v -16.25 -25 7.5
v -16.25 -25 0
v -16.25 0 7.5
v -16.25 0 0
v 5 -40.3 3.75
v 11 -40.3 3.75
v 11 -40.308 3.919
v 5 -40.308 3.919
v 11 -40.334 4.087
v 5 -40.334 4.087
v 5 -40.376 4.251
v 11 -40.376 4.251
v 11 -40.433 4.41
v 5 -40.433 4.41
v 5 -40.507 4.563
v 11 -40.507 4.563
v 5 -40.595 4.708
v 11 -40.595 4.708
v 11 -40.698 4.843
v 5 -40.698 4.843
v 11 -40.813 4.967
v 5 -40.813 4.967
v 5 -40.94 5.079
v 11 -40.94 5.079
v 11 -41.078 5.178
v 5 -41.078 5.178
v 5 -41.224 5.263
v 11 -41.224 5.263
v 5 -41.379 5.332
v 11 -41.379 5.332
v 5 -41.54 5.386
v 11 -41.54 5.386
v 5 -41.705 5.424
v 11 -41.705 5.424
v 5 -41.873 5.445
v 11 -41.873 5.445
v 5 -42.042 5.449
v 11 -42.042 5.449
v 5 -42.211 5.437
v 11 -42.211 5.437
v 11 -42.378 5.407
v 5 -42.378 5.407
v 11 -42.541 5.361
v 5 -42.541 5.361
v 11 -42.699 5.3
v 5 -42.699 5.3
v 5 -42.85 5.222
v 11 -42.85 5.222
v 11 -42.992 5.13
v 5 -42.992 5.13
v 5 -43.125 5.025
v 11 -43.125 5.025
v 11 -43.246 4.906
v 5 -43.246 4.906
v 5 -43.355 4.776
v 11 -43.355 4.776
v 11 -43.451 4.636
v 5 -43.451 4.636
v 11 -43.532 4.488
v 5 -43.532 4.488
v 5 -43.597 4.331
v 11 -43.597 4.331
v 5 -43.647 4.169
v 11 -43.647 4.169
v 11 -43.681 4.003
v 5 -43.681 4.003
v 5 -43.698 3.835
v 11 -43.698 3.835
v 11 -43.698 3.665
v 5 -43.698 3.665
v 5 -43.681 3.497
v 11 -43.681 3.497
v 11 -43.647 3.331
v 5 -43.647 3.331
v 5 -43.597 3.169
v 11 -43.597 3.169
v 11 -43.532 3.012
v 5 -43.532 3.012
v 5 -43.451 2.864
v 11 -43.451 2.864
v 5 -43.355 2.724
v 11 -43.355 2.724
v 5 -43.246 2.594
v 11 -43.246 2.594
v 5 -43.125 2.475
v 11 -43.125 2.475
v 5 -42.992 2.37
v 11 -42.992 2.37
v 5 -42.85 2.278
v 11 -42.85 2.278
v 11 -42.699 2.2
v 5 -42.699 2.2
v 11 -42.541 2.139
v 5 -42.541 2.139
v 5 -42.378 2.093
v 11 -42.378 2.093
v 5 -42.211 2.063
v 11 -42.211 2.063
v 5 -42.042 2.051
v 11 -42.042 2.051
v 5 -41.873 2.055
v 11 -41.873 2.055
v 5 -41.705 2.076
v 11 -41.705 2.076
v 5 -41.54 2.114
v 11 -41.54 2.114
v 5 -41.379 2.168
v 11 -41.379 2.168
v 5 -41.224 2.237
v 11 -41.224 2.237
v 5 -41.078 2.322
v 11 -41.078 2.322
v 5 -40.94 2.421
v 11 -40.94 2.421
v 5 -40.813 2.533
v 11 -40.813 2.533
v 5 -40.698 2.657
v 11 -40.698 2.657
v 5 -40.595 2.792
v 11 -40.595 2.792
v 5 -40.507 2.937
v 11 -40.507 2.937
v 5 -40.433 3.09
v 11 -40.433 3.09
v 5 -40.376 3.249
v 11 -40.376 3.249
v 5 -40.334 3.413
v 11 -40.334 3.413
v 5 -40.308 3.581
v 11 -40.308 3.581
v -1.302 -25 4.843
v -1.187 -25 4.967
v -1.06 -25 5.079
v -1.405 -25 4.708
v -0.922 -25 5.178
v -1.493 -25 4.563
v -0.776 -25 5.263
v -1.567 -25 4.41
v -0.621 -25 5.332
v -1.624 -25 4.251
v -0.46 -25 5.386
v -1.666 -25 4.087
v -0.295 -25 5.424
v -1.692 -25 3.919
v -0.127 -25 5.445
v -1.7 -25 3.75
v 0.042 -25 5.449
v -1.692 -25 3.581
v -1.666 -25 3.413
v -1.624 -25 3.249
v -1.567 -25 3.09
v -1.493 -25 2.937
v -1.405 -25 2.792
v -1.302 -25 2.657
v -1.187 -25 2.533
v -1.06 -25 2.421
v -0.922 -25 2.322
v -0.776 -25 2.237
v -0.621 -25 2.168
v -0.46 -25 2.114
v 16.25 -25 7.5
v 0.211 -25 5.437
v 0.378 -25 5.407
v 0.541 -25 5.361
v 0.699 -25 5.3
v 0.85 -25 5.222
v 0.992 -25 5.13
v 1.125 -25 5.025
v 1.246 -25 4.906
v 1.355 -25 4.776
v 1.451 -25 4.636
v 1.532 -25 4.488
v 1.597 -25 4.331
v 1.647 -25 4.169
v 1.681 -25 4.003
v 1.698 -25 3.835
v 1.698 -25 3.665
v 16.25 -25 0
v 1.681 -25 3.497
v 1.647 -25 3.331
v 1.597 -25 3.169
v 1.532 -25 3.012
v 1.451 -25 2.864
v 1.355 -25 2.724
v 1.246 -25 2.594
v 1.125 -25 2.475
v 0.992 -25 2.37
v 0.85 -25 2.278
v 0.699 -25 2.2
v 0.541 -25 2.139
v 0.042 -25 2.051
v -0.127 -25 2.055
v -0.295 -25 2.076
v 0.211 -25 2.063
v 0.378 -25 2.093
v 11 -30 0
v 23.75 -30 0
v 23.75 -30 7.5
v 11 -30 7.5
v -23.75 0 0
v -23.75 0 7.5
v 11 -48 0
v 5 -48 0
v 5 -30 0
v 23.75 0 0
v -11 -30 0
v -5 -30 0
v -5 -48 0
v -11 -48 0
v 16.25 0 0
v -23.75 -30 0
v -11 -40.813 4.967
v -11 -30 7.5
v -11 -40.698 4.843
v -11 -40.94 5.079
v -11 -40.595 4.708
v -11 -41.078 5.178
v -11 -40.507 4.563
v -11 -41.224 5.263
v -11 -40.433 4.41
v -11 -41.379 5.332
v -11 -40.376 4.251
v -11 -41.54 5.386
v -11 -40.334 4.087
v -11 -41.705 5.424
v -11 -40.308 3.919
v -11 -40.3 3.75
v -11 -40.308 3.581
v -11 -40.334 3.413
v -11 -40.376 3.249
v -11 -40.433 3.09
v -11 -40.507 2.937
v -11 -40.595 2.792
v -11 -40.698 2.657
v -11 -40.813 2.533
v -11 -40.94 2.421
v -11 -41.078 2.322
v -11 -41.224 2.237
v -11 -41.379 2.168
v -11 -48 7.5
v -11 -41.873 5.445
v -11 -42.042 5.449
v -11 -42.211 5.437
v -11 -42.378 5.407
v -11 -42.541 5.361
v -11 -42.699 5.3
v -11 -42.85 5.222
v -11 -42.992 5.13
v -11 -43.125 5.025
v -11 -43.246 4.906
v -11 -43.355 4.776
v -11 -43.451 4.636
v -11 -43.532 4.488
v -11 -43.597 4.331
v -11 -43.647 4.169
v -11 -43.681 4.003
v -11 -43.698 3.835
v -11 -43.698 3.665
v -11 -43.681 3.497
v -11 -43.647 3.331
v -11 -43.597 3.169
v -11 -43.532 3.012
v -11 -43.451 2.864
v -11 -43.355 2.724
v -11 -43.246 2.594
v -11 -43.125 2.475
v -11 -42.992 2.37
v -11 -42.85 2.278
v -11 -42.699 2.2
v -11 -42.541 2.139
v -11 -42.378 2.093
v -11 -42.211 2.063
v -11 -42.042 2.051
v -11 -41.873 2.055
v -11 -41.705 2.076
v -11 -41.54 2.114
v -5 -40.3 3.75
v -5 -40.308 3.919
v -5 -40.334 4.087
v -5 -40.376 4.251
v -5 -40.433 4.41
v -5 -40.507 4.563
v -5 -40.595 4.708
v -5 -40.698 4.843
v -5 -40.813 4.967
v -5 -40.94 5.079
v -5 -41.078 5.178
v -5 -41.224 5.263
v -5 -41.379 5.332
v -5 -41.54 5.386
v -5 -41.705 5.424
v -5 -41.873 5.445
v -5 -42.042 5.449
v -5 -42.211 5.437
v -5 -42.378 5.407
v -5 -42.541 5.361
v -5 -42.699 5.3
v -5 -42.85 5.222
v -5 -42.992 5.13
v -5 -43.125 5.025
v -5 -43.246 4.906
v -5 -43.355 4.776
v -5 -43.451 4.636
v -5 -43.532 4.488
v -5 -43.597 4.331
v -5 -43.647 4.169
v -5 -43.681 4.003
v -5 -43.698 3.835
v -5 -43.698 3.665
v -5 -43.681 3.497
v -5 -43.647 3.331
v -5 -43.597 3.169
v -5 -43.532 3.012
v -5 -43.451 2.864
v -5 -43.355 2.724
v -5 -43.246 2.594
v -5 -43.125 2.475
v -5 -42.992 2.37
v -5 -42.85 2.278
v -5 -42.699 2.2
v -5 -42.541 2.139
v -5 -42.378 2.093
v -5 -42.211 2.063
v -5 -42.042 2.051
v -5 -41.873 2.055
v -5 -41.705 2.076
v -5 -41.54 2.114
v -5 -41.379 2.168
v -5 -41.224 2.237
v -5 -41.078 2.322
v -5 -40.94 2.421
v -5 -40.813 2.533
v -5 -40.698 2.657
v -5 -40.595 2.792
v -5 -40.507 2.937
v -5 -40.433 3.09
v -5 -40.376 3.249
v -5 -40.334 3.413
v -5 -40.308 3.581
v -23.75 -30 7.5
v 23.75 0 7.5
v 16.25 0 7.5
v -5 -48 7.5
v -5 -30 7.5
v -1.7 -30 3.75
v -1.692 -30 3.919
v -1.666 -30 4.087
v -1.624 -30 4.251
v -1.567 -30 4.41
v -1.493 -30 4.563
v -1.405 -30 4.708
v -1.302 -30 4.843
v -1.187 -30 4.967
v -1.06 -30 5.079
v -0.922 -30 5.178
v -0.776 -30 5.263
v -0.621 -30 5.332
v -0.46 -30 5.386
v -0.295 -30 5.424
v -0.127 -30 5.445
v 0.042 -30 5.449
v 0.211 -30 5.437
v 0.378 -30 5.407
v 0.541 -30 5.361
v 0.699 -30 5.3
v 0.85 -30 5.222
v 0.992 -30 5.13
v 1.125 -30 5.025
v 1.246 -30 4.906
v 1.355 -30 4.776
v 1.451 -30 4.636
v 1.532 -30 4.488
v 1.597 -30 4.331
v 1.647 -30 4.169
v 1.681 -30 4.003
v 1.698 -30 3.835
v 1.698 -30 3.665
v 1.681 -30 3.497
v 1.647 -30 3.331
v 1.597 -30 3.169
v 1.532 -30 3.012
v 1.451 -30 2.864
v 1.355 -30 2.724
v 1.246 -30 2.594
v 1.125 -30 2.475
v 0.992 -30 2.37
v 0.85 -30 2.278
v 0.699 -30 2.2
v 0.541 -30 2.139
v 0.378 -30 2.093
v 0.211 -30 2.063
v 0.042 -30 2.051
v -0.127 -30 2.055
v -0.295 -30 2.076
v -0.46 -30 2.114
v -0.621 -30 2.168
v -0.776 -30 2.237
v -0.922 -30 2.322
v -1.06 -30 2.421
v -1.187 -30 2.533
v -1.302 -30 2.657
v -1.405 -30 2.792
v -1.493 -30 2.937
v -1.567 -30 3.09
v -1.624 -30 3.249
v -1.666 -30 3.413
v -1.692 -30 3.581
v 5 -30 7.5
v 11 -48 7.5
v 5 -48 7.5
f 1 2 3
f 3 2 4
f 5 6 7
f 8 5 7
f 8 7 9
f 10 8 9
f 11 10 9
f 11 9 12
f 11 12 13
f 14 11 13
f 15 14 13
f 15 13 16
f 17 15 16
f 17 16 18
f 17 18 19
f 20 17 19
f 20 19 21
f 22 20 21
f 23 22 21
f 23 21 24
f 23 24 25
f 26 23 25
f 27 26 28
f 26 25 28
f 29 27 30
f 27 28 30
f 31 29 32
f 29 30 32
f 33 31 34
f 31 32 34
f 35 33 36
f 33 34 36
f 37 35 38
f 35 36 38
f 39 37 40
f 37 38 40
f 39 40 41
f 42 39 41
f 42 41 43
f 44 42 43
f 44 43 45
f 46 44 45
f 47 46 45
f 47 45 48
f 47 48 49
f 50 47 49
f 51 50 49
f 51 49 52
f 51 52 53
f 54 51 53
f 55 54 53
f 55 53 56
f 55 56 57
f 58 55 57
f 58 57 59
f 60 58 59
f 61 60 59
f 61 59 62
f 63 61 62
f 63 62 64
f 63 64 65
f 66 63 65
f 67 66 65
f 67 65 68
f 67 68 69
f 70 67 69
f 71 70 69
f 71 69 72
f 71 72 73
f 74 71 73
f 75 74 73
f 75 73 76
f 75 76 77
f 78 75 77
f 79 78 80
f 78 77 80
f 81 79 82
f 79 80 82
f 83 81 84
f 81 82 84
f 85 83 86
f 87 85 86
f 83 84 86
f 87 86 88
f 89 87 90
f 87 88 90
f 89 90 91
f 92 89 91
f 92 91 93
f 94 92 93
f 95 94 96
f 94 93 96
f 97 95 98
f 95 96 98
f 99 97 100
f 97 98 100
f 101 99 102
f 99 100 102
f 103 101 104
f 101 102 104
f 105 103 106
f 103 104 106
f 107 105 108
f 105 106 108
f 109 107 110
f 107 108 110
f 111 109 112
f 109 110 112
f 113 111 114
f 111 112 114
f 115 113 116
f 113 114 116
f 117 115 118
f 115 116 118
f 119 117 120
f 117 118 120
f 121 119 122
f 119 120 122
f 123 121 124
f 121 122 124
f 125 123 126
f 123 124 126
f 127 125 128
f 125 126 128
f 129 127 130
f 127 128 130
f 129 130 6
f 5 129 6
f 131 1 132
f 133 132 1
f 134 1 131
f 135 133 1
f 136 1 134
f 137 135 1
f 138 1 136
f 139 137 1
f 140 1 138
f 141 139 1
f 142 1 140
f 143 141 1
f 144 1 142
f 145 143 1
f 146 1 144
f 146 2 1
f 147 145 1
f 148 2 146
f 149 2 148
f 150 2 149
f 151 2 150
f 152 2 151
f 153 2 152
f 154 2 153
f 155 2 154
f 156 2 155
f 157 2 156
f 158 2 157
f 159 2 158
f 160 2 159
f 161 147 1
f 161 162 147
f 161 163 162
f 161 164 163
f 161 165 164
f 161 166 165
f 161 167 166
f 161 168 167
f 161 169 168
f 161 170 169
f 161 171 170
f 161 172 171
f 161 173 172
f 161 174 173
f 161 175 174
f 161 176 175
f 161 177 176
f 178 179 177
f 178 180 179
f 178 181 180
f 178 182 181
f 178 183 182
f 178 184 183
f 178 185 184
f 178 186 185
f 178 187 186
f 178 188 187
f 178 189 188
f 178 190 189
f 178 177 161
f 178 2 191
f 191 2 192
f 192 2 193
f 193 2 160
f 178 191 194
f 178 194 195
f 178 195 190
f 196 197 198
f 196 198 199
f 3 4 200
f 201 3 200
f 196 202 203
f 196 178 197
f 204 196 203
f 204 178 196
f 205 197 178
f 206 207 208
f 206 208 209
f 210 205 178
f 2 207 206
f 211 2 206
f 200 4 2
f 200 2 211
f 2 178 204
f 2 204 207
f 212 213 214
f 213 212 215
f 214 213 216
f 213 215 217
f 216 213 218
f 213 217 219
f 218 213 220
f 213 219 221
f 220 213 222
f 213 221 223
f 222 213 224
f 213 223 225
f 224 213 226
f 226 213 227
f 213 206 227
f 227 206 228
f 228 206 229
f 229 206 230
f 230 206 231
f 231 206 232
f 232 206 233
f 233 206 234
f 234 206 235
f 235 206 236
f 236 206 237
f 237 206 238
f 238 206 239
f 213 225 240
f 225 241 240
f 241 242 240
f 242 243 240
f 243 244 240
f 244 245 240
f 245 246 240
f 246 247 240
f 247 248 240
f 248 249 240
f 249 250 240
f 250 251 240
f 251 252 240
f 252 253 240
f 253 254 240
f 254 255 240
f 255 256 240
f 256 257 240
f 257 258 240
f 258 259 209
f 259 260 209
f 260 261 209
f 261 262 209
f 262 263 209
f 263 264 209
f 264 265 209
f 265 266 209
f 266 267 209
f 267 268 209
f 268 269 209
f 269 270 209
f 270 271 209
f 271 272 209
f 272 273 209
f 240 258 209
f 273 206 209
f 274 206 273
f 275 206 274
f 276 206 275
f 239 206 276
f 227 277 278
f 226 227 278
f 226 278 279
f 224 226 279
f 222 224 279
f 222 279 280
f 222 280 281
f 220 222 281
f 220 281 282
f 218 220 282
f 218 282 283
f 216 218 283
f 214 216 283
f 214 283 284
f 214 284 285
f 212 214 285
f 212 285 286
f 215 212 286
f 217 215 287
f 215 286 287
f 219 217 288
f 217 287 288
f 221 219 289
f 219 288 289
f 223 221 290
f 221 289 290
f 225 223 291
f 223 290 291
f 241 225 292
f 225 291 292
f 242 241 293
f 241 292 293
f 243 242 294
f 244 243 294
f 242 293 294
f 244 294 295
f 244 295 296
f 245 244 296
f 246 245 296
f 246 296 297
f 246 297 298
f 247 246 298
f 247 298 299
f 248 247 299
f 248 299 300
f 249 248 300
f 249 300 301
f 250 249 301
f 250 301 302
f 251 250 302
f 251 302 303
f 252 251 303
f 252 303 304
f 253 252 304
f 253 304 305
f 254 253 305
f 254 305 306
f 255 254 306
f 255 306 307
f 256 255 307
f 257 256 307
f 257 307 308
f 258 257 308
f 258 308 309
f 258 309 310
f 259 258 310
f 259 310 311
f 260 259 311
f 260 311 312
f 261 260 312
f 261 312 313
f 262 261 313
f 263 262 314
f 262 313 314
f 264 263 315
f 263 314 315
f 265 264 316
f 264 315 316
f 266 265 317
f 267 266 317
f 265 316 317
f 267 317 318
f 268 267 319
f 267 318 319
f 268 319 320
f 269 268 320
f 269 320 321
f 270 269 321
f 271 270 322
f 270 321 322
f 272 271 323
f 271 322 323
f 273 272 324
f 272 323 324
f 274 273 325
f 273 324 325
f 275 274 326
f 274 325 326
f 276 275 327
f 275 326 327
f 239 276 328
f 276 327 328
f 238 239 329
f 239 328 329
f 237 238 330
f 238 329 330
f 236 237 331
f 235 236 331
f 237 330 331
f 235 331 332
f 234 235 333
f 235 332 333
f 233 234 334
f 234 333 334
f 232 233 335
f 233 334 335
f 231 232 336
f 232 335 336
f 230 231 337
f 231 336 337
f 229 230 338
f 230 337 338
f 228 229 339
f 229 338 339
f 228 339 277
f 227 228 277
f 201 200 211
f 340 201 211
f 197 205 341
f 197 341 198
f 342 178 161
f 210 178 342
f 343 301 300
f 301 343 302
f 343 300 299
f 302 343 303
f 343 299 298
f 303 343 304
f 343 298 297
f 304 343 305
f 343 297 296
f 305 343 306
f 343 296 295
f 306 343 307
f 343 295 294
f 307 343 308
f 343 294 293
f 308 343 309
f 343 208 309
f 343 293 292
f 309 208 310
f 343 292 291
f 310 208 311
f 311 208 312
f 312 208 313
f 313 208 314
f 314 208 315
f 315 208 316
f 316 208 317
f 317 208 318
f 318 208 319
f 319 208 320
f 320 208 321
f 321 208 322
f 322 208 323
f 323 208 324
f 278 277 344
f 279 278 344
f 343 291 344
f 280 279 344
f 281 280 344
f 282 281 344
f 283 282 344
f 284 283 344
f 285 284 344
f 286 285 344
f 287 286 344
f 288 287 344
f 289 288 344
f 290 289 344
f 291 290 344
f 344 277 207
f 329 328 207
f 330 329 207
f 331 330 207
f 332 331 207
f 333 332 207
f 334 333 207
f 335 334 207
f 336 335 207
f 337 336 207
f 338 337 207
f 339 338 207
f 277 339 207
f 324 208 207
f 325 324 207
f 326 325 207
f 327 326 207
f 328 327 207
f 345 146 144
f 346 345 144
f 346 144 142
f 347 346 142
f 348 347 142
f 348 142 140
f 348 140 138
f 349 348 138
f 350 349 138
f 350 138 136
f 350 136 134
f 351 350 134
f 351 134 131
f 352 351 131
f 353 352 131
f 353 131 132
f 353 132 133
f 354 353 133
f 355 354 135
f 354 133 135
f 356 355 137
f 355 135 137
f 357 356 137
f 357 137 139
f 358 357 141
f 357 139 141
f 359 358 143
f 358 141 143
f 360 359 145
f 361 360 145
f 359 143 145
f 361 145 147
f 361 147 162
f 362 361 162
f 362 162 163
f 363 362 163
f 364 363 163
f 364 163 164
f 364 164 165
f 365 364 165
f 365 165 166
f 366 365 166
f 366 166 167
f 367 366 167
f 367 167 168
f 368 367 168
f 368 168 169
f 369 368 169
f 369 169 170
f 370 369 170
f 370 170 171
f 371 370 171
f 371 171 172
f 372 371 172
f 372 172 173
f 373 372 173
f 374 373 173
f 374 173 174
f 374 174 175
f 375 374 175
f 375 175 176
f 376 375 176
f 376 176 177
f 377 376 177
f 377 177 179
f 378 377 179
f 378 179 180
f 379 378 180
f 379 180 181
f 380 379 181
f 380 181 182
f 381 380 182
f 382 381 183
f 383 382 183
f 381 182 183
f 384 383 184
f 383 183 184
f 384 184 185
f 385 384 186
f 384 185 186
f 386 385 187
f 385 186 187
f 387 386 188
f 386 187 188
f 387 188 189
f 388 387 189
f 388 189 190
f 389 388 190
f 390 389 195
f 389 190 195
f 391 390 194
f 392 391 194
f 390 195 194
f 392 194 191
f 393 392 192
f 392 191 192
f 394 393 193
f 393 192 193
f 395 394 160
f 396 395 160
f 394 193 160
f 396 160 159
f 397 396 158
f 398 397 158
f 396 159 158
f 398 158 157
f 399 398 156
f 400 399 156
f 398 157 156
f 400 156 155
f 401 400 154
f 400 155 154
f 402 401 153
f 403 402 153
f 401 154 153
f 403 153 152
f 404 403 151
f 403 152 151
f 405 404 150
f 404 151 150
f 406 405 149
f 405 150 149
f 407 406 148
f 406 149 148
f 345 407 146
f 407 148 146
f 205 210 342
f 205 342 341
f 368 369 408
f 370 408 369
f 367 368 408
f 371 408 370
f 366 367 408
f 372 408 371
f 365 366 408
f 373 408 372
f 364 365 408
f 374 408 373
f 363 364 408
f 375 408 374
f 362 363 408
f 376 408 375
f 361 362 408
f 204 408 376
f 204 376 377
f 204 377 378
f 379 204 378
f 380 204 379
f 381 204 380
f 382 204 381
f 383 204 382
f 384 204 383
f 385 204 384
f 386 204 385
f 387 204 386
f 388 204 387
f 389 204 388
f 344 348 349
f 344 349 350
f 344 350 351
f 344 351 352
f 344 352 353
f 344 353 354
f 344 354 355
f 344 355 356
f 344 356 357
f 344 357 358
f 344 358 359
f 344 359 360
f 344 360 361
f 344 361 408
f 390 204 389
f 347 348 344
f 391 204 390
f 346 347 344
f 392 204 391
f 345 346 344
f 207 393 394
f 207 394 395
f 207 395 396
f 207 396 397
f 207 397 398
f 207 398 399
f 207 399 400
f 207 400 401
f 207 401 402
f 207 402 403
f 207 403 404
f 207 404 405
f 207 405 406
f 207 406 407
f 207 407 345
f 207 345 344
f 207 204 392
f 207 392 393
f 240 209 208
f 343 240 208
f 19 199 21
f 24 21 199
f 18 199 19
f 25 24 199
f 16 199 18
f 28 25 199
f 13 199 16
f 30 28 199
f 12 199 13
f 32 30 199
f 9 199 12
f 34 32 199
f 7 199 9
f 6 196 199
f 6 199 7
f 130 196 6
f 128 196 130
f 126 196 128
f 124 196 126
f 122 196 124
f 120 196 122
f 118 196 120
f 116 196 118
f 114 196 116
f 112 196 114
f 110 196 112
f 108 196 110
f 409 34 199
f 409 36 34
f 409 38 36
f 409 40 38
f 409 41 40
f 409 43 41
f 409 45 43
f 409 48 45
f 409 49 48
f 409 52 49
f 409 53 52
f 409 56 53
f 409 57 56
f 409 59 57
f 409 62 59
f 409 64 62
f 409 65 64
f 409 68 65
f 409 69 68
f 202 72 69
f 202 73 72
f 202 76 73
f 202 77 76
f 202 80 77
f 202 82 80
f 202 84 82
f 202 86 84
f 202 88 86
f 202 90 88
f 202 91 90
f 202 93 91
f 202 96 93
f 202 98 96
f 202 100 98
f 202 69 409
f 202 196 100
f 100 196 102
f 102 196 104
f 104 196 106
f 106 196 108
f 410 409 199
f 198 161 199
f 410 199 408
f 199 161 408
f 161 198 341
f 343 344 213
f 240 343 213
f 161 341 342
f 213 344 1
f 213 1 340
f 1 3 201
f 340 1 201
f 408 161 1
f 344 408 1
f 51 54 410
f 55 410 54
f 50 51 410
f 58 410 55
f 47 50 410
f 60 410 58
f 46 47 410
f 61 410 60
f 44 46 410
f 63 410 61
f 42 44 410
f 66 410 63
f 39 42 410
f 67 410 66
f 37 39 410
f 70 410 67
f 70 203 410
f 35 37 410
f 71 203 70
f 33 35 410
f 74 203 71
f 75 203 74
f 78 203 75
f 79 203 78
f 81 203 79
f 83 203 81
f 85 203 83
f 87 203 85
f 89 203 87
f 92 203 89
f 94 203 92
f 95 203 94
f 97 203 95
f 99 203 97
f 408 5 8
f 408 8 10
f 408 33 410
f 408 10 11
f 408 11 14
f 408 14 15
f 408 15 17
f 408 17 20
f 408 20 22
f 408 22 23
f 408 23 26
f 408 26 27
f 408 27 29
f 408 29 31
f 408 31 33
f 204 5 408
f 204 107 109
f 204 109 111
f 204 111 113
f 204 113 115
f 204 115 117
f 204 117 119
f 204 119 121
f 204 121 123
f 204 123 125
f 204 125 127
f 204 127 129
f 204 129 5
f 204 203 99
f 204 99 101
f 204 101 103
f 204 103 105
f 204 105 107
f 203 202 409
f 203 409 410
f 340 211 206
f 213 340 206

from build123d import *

# Parameters (mm, degrees)
RESSALTO_EXTRUS_O1_DEPTH = 7.5
ESBO_O2_R                = 1.7
CORTE_EXTRUS_O1_DEPTH    = 60.731168581
ESBO_O3_R                = 1.7
CORTE_EXTRUS_O2_DEPTH    = 55.076912819


with BuildPart() as part:
    # Esboço1 → Ressalto-extrusão1 (new body)
    with BuildSketch(Plane.XY):
        Polygon((-23.75, 0), (-23.75, -30), (-11, -30), (-11, -48), (-5, -48), (-5, -40), (-5, -30), (0, -30), (0, -25), (-16.25, -25), (-16.25, 0), align=None)
    ressalto_extrus_o1 = extrude(amount=RESSALTO_EXTRUS_O1_DEPTH)

    # Espelhar1: Ressalto-extrusão1 across plane
    add(ressalto_extrus_o1.mirror(Plane(origin=(0, -30, 7.5), x_dir=(0, 0, 1), z_dir=(-1, 0, 0))))

    # Esboço2 → Corte-extrusão1 (cut, through all)
    with BuildSketch(Plane(origin=(11, 0, 0), x_dir=(0, 0, -1), z_dir=(1, 0, 0))):
        with Locations(Location((-3.75, -42, 0), (0, 0, 90))):
            Circle(ESBO_O2_R)
    extrude(amount=-CORTE_EXTRUS_O1_DEPTH, mode=Mode.SUBTRACT)

    # Esboço3 → Corte-extrusão2 (cut, through all)
    with BuildSketch(Plane(origin=(0, 0, 0), x_dir=(1, 0, 0), z_dir=(0, 1, 0))):
        with Locations(Location((0, -3.75, 0), (0, 0, 180))):
            Circle(ESBO_O3_R)
    extrude(amount=-CORTE_EXTRUS_O2_DEPTH, mode=Mode.SUBTRACT)


solid = part.part
